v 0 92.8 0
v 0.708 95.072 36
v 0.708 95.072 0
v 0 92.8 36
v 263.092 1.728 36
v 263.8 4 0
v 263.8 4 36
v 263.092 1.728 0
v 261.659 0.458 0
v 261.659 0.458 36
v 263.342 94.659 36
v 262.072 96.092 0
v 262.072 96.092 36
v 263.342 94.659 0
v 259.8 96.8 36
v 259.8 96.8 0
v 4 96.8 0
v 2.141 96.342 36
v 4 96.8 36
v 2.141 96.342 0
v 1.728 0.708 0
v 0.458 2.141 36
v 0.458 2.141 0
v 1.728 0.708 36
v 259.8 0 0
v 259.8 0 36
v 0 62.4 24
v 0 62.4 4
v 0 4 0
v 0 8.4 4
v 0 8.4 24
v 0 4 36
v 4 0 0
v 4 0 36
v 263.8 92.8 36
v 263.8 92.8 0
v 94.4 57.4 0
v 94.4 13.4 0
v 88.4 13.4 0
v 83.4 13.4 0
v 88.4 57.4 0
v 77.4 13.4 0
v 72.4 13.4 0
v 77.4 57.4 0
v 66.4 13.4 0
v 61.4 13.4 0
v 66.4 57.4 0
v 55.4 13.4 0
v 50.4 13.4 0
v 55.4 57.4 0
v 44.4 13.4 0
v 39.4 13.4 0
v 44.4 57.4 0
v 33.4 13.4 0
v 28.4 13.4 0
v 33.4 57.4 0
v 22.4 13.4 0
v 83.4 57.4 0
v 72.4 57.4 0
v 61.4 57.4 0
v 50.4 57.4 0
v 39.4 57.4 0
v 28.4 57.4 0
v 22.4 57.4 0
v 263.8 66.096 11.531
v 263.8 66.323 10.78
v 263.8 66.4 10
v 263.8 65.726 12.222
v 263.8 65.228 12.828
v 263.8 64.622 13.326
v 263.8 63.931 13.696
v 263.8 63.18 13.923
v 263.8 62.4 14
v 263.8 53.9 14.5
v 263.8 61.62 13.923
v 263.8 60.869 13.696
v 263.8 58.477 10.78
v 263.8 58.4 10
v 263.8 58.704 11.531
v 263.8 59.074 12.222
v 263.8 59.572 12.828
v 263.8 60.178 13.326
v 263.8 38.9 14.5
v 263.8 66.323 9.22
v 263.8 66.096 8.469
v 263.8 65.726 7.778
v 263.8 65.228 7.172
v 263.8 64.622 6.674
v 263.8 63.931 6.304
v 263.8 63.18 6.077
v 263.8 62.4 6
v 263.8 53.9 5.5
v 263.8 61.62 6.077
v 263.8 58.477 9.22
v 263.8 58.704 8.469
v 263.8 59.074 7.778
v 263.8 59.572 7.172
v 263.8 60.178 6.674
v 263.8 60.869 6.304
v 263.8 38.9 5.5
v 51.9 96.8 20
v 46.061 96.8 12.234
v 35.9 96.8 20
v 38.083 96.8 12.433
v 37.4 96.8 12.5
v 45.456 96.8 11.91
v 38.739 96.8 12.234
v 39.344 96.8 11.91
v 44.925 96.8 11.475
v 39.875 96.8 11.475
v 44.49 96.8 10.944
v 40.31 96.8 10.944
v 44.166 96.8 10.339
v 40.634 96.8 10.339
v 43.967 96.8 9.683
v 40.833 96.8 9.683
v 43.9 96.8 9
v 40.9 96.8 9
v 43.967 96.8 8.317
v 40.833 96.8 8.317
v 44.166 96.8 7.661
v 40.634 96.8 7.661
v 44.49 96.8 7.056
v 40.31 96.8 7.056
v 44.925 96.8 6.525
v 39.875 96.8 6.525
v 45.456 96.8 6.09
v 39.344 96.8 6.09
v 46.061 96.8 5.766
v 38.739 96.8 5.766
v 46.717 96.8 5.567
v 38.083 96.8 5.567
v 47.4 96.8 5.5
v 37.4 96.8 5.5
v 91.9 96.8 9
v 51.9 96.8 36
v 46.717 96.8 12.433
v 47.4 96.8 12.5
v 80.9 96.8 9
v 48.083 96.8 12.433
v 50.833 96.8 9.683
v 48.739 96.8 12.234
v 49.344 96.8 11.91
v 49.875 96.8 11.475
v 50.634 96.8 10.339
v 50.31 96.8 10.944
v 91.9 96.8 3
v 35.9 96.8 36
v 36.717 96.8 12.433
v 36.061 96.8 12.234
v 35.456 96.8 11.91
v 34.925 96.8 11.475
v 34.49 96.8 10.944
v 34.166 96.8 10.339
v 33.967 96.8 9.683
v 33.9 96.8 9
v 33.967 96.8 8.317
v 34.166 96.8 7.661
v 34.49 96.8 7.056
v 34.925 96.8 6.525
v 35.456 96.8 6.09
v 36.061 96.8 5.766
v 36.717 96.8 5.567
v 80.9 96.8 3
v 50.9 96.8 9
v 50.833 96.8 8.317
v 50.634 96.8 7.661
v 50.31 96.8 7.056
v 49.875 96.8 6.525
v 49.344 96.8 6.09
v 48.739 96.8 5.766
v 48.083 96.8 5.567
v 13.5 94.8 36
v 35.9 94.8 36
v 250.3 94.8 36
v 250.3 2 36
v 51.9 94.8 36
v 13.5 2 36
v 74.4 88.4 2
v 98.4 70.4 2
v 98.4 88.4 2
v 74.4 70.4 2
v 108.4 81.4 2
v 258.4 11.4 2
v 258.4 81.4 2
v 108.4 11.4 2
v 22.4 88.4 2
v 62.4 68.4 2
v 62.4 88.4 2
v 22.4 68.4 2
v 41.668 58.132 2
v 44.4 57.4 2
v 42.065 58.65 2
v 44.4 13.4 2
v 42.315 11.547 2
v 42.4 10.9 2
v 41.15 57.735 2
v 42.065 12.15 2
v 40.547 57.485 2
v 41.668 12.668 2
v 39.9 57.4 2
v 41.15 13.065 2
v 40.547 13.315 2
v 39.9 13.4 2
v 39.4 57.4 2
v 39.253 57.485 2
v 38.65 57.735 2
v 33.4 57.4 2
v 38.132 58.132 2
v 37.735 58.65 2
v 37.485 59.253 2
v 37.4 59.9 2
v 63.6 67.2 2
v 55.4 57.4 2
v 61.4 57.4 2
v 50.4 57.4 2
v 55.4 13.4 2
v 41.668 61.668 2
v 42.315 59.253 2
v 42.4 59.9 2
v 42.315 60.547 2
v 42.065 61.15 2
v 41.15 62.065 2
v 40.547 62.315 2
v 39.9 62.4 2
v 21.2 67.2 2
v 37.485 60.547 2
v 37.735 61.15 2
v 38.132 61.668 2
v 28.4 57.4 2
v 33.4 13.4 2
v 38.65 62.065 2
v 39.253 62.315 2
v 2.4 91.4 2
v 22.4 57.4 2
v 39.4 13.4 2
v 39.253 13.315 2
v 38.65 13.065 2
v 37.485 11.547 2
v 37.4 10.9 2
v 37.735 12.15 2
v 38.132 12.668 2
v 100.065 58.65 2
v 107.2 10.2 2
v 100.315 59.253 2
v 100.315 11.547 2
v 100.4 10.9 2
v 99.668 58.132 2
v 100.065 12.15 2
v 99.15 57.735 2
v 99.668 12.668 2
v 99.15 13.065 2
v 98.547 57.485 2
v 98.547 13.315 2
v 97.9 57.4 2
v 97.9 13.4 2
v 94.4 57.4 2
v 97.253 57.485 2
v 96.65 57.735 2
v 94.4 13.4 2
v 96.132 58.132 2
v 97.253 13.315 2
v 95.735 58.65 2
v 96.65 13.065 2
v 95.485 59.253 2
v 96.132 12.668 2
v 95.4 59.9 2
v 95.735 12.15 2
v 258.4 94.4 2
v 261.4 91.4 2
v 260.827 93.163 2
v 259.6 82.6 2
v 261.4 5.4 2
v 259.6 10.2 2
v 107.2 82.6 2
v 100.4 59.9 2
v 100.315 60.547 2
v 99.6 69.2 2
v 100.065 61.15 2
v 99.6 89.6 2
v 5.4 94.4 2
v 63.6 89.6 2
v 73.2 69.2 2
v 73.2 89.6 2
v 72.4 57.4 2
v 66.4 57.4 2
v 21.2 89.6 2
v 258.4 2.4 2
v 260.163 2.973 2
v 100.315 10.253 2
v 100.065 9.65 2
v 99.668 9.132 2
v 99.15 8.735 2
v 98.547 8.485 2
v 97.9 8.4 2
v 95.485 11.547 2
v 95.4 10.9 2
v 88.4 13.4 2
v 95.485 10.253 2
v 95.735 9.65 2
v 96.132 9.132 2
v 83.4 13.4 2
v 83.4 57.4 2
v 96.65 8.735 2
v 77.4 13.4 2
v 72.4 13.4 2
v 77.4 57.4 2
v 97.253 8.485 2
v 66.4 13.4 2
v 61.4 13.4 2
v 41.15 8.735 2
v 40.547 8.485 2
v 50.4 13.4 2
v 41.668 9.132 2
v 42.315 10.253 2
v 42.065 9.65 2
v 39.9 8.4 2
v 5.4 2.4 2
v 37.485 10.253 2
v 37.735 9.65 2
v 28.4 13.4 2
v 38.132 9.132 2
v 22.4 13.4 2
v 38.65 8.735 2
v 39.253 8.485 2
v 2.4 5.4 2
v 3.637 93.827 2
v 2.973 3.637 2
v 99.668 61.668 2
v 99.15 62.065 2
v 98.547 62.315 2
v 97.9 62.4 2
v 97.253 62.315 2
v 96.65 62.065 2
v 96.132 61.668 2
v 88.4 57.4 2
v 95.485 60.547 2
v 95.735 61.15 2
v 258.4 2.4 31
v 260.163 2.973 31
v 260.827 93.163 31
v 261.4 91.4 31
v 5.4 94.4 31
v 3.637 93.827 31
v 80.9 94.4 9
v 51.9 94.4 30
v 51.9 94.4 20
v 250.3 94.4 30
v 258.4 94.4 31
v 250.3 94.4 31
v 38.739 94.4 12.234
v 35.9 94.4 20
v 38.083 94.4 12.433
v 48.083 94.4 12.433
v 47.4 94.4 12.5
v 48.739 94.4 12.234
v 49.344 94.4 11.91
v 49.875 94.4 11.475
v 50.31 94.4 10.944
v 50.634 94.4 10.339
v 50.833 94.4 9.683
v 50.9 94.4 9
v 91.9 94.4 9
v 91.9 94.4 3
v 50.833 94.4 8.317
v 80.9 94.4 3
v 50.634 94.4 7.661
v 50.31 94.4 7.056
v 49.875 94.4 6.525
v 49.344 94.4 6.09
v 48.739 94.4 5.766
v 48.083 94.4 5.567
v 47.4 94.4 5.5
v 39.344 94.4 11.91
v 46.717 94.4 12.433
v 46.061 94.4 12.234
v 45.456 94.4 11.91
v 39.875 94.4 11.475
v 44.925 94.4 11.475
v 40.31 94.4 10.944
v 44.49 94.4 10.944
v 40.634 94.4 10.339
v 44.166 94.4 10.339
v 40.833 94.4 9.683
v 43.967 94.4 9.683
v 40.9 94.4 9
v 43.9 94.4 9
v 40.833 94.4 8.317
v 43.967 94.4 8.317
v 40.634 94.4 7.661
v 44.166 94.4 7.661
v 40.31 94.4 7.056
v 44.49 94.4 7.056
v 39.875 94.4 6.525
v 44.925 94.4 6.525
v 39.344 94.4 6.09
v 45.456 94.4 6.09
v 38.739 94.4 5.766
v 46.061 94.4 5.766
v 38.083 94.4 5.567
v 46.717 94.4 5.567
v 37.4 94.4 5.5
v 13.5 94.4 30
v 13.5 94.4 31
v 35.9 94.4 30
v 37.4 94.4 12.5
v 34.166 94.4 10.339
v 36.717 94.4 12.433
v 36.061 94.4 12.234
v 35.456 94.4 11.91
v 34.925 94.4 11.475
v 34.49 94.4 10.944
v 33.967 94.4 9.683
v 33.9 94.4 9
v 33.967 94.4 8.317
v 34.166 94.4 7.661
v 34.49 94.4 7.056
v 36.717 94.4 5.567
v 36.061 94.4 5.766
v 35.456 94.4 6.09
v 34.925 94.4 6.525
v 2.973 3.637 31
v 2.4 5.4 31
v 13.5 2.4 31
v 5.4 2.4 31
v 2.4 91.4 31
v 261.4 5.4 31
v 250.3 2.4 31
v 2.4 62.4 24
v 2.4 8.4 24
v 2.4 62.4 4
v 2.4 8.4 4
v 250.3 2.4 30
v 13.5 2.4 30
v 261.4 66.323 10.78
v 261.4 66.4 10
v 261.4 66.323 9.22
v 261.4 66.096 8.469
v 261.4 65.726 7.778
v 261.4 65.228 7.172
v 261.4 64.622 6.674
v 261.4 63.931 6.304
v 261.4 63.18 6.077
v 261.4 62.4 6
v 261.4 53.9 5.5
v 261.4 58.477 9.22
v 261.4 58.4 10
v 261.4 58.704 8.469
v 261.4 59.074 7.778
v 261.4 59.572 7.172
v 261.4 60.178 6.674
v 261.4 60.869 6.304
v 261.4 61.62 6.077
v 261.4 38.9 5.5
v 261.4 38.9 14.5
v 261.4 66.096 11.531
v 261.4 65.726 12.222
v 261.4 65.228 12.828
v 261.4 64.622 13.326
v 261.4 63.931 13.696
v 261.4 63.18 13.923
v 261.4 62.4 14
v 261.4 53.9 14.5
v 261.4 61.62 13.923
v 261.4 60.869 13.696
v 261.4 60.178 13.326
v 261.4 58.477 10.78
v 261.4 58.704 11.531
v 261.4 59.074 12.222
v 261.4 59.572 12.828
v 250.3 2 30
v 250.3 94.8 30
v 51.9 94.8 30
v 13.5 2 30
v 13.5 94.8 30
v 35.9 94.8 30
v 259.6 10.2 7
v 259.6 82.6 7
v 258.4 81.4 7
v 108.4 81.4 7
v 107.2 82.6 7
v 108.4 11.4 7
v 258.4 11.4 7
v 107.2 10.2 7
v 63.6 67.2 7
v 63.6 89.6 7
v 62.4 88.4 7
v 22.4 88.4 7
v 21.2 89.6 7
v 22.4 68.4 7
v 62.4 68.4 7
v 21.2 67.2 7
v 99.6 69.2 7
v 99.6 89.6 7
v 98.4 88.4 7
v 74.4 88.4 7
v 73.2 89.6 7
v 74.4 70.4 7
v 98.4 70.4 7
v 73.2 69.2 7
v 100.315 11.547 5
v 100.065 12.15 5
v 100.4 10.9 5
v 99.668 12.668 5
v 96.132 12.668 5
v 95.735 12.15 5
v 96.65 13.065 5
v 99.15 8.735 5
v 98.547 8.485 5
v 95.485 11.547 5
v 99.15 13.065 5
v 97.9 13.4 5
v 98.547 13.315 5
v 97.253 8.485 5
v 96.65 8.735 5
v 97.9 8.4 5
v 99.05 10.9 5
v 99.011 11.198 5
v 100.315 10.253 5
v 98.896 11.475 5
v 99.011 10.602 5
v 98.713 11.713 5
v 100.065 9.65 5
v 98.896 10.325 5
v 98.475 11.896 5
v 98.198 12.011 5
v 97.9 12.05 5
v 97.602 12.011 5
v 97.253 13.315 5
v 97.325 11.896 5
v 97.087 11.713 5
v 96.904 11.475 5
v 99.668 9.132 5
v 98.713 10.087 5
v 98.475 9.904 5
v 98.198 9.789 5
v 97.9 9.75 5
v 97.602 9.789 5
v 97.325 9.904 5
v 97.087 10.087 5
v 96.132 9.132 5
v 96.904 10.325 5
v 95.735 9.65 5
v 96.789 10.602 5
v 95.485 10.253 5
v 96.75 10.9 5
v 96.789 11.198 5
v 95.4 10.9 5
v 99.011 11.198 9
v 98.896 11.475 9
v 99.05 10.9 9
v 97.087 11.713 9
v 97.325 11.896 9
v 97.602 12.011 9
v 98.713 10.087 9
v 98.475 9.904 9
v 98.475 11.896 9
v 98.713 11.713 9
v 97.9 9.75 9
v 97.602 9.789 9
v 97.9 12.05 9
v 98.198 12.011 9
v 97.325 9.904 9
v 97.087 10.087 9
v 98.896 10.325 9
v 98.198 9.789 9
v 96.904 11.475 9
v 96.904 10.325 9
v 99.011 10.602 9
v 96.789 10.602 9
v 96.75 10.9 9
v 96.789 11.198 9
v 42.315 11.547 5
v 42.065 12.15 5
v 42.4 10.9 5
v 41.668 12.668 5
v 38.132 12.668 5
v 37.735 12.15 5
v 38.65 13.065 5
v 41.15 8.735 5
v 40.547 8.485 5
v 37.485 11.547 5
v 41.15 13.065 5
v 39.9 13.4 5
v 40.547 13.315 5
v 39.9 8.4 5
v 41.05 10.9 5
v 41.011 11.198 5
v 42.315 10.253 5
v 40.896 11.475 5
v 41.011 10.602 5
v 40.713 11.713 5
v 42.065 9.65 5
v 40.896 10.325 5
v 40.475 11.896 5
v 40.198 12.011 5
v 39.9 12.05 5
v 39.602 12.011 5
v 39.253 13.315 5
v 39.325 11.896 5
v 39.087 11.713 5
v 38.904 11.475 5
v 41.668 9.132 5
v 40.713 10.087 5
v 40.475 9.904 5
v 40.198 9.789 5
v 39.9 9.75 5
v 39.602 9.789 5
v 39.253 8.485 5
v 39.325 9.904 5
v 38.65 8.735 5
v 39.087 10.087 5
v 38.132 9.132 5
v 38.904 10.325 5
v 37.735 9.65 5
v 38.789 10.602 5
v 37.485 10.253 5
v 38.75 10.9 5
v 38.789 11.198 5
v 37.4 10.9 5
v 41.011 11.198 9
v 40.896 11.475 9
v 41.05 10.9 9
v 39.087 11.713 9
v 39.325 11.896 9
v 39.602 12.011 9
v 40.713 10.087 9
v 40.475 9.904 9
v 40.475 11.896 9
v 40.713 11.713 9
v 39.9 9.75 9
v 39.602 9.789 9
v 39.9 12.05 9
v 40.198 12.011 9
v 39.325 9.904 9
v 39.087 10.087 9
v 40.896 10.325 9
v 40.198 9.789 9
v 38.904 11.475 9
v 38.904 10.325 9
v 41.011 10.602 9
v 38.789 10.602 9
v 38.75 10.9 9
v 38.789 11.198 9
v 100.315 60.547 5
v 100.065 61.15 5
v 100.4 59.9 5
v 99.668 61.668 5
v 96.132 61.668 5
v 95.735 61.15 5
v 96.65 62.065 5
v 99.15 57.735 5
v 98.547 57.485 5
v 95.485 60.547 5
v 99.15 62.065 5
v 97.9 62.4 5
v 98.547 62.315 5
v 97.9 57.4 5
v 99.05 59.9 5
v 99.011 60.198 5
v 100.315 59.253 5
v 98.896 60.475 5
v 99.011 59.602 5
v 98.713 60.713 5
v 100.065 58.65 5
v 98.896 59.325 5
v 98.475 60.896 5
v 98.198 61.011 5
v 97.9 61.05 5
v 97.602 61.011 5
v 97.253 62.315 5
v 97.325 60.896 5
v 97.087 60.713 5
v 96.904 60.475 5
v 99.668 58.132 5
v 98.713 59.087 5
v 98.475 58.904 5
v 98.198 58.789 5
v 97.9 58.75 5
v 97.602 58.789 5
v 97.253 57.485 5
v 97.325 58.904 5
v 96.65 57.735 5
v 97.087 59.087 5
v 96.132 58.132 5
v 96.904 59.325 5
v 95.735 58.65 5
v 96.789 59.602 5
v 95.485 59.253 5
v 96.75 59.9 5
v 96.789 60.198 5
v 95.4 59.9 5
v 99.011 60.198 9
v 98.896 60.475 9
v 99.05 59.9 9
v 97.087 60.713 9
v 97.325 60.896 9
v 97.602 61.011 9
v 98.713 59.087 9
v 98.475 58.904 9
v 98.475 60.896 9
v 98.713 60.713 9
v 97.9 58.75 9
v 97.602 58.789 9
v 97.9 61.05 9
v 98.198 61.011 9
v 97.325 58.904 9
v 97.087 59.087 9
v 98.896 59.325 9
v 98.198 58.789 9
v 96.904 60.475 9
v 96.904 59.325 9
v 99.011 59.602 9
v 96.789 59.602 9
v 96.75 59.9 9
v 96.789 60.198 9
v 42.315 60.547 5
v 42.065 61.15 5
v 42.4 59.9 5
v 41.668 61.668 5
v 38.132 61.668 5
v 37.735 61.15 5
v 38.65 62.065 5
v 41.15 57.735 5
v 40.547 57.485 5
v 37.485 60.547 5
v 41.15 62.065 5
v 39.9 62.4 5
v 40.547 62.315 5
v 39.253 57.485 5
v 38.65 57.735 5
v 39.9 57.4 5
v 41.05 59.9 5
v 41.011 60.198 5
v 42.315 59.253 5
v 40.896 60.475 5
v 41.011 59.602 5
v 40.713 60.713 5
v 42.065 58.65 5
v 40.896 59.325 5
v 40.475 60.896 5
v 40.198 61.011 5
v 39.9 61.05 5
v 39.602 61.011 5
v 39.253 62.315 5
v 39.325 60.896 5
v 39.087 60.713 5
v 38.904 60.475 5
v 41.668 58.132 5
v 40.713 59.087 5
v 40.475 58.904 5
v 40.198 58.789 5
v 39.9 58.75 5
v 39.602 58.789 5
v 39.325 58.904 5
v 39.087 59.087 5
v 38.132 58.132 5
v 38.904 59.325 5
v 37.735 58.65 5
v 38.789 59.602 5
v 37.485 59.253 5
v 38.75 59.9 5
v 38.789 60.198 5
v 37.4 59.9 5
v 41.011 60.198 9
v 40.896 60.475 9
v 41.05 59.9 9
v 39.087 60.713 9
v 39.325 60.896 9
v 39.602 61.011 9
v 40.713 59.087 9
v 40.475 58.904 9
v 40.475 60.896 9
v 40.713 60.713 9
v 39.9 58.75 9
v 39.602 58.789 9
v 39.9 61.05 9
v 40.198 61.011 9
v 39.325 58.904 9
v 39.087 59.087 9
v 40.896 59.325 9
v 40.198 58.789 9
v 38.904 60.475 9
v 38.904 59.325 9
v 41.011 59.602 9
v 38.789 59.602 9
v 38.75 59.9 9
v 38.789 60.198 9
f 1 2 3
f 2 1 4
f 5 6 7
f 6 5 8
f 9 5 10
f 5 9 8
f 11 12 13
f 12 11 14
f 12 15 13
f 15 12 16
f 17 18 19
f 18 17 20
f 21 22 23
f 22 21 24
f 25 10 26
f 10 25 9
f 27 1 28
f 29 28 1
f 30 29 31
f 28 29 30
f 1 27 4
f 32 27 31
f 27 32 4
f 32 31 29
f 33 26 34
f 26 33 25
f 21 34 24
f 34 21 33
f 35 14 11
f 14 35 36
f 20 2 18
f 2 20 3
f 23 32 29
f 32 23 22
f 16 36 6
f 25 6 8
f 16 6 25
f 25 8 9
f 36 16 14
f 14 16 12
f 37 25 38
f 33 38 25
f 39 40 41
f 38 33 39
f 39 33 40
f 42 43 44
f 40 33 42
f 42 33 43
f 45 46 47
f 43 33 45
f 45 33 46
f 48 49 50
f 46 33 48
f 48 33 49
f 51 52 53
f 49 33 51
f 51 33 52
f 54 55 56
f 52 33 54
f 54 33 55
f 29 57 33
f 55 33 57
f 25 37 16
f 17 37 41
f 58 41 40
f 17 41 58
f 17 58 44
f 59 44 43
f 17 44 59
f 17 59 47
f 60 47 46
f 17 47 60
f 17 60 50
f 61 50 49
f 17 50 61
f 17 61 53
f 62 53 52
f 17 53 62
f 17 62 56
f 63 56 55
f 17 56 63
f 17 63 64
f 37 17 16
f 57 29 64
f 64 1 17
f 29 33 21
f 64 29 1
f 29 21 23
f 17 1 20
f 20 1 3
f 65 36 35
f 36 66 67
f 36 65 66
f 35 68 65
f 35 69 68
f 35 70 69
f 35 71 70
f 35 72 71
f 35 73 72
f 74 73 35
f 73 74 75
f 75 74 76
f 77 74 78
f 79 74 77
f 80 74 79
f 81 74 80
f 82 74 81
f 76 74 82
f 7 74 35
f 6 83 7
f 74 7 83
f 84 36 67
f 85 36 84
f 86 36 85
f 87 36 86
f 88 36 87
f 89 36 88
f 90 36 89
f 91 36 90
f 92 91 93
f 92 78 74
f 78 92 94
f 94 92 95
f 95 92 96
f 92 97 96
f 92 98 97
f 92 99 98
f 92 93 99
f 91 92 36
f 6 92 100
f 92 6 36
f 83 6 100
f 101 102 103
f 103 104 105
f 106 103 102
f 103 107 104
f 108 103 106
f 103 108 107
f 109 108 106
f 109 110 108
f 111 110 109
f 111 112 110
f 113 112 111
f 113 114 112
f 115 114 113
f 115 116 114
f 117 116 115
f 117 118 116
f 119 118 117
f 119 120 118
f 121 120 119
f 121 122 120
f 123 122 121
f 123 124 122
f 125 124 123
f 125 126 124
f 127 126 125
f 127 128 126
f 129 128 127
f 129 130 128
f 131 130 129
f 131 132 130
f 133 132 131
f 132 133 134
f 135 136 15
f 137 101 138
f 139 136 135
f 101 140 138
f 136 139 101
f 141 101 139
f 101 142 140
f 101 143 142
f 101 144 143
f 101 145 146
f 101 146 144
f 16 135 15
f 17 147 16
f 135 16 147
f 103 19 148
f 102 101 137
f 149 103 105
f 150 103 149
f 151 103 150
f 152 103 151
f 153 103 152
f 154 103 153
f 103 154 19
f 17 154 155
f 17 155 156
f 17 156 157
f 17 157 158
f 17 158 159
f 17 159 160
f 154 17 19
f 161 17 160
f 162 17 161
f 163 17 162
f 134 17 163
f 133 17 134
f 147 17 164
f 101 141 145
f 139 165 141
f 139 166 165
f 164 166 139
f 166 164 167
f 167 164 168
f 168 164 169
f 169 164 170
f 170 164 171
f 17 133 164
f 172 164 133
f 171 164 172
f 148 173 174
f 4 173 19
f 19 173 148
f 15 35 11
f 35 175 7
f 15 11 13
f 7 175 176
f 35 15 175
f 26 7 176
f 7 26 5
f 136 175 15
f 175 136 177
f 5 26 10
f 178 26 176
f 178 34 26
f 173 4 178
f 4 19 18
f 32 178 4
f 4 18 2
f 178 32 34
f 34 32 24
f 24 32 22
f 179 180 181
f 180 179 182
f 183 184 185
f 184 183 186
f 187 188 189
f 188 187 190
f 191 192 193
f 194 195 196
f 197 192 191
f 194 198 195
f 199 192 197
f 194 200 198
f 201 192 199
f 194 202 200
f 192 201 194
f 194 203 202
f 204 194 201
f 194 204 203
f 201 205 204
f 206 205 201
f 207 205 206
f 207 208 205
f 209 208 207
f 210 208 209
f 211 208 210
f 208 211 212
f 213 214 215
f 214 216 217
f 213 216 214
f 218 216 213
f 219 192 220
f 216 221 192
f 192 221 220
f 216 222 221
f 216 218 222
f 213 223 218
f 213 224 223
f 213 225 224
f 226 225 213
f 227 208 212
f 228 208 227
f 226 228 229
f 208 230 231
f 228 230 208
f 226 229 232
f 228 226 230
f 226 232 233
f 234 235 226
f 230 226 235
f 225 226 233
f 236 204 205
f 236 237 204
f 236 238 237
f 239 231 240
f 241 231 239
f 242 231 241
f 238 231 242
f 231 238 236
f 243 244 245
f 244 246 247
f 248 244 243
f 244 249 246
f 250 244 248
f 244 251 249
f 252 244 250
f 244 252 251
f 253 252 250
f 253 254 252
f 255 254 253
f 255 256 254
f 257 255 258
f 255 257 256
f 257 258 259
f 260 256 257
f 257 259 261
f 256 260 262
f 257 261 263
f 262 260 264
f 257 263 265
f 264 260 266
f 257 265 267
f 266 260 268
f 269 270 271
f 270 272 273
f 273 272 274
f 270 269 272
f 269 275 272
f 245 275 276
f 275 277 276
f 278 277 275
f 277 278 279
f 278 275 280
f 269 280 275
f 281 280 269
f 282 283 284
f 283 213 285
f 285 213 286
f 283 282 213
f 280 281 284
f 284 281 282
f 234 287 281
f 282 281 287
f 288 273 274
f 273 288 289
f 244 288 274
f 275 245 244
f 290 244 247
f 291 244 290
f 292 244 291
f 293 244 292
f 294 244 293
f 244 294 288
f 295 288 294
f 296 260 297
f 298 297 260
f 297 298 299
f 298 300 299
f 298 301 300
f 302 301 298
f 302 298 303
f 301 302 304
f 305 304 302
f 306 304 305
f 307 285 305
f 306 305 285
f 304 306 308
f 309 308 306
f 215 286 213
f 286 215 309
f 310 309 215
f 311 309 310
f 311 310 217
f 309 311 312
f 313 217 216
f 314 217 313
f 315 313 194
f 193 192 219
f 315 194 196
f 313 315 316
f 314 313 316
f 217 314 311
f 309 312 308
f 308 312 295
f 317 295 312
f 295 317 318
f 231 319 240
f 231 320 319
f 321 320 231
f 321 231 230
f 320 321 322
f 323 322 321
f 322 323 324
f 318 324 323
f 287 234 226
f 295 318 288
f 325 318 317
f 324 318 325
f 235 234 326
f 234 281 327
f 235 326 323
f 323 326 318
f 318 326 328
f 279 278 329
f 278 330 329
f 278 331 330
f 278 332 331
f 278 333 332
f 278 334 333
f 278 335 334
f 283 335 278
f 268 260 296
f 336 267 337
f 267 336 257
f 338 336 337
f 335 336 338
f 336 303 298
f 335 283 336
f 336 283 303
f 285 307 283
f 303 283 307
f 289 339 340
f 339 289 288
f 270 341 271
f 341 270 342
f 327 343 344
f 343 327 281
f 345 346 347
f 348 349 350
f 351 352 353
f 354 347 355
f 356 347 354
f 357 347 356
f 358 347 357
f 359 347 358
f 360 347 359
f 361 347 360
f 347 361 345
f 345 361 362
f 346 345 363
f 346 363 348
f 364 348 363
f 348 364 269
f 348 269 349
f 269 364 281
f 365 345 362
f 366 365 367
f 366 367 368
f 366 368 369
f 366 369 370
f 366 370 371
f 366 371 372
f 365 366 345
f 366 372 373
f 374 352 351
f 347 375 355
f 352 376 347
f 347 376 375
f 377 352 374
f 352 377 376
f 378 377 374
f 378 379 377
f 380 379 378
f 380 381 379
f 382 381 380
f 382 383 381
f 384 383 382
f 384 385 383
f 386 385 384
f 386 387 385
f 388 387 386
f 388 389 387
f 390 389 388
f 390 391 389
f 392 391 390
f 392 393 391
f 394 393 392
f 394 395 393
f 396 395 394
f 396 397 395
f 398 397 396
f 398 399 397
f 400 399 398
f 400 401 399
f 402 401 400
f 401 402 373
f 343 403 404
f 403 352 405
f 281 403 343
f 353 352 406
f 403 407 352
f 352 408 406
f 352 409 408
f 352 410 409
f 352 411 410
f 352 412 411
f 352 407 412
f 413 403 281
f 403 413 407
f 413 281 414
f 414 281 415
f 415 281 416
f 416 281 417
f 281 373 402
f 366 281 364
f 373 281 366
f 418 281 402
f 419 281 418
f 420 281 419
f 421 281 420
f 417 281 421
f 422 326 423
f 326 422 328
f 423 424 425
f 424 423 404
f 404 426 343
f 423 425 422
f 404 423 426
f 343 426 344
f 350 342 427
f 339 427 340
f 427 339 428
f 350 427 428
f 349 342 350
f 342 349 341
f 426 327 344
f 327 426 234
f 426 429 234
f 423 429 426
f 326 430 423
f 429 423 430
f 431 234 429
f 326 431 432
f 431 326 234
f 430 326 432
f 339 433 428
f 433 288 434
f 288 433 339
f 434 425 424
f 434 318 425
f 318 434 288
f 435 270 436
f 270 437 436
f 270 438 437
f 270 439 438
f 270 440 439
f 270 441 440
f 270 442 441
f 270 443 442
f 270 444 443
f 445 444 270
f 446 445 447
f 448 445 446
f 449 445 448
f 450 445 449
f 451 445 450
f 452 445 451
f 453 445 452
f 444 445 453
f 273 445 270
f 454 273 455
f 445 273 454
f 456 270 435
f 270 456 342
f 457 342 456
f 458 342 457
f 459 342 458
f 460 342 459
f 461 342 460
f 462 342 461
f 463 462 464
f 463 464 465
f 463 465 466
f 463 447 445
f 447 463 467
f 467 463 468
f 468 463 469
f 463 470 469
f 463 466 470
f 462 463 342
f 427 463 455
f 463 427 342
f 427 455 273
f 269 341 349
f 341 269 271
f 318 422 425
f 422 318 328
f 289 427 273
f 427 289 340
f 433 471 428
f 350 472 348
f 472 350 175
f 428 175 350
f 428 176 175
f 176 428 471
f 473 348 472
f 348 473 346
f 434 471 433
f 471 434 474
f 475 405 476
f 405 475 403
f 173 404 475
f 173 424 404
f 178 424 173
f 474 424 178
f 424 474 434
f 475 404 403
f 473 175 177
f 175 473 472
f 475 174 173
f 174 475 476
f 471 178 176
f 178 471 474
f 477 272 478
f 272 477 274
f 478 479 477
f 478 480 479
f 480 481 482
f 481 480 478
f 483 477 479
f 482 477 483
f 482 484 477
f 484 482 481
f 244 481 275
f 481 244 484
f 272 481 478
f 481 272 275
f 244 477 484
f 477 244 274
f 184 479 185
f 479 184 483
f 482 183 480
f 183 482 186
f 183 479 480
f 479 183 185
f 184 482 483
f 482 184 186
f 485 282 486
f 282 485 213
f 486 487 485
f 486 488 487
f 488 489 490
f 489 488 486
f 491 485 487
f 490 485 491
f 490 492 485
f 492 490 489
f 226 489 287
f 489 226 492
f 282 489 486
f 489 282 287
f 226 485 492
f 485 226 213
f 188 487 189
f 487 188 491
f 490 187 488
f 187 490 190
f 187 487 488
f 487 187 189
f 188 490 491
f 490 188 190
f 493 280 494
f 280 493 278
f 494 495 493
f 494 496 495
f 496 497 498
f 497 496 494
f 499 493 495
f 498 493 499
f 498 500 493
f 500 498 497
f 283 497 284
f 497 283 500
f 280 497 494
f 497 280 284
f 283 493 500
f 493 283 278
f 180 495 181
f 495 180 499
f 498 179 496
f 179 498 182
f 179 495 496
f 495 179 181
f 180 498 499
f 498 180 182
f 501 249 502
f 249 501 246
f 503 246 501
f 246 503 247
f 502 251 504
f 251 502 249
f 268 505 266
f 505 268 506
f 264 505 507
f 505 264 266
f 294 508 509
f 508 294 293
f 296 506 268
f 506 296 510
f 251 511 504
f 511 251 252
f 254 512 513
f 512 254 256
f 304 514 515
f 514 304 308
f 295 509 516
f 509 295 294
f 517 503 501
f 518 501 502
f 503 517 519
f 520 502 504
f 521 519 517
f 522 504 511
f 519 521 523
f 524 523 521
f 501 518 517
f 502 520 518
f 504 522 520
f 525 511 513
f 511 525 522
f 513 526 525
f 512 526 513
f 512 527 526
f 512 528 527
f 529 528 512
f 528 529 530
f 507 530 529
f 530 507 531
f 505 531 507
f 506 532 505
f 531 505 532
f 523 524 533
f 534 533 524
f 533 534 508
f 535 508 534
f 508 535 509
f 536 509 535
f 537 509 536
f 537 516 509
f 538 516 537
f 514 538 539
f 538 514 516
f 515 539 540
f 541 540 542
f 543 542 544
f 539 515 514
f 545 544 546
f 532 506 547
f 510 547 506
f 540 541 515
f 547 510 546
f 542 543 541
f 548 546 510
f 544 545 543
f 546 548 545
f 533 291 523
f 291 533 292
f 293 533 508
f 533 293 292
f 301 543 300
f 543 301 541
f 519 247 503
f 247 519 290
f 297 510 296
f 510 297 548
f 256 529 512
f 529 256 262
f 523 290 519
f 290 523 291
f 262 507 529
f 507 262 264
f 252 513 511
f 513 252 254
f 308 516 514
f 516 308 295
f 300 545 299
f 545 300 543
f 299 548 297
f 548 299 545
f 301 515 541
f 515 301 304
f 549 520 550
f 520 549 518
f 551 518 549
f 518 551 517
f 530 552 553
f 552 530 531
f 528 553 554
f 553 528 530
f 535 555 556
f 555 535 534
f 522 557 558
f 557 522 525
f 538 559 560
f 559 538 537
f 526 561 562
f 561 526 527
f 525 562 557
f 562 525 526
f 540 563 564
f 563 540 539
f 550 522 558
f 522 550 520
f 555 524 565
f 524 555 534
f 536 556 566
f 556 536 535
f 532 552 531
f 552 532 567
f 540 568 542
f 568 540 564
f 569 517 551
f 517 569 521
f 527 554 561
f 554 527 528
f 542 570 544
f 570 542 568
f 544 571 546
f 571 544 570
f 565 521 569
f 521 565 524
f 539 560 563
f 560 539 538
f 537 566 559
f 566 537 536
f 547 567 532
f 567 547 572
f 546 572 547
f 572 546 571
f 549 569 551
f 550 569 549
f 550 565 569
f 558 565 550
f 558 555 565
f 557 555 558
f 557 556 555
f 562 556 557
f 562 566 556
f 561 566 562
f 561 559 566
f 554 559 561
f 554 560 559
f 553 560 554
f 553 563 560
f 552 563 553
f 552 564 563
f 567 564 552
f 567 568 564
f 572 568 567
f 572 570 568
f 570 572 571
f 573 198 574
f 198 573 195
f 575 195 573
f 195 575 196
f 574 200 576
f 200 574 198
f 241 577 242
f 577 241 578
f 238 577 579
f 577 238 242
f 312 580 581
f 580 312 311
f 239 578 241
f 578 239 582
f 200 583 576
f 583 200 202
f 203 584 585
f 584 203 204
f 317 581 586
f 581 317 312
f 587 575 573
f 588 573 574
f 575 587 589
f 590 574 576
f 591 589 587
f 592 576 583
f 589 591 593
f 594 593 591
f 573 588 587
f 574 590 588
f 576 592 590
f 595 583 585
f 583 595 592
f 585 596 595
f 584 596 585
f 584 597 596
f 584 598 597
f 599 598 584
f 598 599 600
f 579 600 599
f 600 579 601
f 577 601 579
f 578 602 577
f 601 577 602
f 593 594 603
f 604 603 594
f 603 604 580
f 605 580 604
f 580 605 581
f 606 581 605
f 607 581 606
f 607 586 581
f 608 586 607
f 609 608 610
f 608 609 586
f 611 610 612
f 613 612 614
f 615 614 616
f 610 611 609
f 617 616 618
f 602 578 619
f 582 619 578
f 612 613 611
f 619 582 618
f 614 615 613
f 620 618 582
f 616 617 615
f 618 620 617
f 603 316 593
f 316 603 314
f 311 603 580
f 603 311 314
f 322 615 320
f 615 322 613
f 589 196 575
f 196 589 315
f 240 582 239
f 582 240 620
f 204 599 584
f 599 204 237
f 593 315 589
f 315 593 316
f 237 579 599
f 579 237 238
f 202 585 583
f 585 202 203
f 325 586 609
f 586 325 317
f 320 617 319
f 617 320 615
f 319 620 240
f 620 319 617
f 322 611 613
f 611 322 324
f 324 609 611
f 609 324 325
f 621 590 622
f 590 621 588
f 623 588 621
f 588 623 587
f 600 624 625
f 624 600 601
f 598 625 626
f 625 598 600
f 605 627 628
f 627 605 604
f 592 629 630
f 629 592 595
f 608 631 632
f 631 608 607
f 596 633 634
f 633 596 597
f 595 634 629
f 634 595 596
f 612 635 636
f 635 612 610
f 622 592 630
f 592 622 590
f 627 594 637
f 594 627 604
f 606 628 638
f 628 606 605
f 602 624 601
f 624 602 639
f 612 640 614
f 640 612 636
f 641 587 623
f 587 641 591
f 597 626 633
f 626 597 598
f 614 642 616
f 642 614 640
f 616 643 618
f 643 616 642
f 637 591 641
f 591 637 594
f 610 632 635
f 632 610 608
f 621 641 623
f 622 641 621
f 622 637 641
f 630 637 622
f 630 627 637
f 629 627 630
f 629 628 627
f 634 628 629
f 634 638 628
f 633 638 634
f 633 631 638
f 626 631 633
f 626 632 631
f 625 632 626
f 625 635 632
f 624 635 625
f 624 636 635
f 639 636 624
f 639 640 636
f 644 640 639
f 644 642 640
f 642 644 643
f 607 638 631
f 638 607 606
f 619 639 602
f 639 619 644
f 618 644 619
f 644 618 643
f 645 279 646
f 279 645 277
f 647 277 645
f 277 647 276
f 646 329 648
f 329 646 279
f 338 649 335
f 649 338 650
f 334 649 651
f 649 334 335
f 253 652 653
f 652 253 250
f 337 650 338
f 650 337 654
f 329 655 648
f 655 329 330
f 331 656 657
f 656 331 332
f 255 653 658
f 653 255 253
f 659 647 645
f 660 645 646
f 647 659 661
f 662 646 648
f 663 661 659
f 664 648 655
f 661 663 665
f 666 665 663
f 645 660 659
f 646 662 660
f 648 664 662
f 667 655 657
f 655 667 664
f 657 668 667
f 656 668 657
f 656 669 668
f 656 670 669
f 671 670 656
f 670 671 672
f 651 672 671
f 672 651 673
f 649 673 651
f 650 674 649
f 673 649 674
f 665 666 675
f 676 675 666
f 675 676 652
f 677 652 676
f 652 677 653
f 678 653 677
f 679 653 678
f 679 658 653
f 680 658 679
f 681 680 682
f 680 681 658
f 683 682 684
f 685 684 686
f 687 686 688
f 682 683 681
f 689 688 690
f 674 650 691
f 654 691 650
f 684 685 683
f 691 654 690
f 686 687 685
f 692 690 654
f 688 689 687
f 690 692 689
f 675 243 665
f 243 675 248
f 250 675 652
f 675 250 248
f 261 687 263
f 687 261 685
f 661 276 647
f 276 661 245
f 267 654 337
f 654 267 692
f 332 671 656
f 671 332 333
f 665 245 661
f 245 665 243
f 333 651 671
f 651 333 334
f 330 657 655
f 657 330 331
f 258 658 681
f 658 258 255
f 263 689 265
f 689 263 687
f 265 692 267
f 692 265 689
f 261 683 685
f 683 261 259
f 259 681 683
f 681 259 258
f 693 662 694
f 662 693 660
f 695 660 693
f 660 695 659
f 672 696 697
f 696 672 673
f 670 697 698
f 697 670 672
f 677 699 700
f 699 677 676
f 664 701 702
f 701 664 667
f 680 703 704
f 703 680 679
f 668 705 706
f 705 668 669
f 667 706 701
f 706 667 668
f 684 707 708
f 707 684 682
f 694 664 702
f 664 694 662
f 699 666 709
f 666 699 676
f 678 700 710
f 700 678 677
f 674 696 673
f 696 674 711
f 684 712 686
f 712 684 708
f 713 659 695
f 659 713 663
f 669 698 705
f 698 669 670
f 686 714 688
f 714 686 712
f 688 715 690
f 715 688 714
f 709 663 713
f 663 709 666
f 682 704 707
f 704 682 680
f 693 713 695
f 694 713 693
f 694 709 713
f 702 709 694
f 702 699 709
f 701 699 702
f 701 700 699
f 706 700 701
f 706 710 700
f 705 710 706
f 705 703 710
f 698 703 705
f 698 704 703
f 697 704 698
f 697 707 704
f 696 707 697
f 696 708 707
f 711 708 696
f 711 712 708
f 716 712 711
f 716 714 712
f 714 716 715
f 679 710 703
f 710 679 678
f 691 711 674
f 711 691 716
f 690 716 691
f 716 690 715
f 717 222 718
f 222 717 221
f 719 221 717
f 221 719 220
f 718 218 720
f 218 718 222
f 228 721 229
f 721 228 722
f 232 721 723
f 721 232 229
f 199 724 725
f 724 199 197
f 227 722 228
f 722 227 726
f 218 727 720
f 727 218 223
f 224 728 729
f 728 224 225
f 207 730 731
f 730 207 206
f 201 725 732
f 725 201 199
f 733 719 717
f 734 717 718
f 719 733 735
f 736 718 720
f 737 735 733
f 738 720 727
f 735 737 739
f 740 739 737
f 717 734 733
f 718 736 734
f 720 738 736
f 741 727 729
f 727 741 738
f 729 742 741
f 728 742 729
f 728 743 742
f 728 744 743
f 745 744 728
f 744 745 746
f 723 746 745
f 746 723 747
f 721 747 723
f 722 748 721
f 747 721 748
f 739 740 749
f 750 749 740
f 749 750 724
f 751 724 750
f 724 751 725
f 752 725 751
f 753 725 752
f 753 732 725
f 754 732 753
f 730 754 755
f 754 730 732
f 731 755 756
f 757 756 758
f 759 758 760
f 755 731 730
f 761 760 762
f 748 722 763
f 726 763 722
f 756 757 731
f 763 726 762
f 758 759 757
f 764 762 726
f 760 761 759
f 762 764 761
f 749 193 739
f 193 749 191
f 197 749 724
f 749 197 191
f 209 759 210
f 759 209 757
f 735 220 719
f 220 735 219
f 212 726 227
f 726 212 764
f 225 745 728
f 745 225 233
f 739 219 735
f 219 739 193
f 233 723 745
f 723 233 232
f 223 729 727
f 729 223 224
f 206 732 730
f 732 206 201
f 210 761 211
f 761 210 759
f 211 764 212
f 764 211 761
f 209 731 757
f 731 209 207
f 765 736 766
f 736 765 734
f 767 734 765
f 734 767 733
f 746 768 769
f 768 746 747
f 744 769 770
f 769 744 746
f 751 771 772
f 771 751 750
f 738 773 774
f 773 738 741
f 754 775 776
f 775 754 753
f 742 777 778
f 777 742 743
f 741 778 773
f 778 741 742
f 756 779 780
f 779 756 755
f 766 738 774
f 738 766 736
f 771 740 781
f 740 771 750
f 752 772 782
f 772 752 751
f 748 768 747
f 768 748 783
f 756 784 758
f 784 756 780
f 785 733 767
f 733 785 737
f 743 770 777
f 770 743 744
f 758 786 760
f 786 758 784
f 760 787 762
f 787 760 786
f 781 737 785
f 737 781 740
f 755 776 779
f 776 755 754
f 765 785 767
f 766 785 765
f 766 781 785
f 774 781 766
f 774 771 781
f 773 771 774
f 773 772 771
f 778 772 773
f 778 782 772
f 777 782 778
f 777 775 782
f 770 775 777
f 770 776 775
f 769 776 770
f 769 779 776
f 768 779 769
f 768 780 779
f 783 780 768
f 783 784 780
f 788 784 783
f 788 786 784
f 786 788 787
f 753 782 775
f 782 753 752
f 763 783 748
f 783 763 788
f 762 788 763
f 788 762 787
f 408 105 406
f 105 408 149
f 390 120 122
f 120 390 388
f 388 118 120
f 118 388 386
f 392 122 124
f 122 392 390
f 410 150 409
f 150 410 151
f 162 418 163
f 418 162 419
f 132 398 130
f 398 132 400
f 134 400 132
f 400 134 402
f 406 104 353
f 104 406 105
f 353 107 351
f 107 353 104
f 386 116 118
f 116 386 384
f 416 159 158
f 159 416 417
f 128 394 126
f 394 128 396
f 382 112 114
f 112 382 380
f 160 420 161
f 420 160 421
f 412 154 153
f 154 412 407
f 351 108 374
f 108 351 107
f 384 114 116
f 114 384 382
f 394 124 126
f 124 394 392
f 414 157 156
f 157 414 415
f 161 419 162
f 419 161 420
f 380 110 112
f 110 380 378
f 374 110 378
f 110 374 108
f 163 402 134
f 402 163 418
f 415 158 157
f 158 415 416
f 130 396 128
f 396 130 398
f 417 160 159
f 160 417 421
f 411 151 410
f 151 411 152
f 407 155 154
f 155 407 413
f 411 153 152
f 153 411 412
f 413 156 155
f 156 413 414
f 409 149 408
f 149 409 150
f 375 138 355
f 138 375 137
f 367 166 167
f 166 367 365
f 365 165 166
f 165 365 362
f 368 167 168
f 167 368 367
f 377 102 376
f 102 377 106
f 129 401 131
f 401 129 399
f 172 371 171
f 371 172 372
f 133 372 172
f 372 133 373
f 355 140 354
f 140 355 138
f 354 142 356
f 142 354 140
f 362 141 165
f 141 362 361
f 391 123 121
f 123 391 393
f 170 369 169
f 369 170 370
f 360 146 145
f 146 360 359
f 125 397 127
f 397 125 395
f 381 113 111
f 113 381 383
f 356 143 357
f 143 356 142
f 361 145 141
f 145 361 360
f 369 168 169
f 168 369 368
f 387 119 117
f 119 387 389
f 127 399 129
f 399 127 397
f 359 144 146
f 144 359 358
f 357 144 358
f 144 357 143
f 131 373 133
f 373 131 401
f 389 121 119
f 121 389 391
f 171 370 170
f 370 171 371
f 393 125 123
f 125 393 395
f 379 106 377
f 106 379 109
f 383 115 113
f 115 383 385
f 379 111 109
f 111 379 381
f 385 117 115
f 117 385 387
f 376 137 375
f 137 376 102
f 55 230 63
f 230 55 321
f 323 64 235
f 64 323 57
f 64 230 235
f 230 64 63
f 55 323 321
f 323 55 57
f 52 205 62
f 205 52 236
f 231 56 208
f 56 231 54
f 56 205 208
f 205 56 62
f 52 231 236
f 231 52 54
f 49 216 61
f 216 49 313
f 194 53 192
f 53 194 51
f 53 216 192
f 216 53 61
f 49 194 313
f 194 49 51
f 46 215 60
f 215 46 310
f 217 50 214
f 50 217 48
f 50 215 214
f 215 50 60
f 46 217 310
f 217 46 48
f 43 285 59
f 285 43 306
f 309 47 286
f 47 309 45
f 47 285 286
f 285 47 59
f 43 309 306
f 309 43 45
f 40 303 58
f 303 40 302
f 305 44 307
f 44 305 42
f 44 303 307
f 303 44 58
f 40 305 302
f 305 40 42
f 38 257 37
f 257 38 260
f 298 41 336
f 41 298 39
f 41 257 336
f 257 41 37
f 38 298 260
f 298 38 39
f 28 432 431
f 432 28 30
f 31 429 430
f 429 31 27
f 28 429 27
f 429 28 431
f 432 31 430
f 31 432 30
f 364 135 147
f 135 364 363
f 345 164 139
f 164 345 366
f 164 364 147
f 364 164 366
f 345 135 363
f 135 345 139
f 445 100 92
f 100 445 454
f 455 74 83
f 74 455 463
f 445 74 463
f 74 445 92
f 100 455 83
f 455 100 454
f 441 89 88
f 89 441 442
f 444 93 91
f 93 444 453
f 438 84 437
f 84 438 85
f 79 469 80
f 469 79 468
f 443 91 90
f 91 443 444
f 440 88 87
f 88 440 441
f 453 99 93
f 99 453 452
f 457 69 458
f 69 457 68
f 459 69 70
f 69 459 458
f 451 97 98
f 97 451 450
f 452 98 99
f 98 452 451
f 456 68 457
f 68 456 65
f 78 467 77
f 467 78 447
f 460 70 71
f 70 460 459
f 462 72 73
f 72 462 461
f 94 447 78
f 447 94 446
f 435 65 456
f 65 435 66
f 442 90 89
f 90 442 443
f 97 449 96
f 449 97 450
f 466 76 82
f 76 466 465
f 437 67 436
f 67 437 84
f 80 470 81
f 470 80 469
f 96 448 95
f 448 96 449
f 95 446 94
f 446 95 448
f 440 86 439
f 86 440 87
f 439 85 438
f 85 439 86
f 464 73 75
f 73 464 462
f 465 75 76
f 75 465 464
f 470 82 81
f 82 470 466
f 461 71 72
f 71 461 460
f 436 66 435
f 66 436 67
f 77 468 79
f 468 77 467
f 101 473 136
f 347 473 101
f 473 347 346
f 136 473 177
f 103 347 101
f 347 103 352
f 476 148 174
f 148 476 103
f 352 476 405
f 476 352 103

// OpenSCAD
// SAGGA HUB: the tray under the FM-1 that holds the modules: Raspberry Pi 3B, powerbank, MICROMIDITRS-USB v2,
// RP2040-Zero. Parametric: measure your own parts and the FM-1, put the numbers in the first block, press F6, export
// the STL. Units: mm. The FM-1 sits on top in a shallow seat and closes the tray; the modules sit below in pockets;
// the cables run in the gap above them. Print: PETG or PLA, 0.2 mm layers, 3 walls, no supports (open top).
//
// Coordinates: x from the left wall, y from the front wall, z from the floor; module positions are those of their
// front-left corner INSIDE the tray (the wall thickness is added for you).

// ============================ 1. measure these ============================
// the FM-1: length left-right, depth front-back, height; and where its ports are on its back face
fm1 = [236, 92, 34];                 // PLACEHOLDER
fm1_usbc_from_left = 30;             // PLACEHOLDER: centre of its USB-C socket, from its left edge
fm1_seat_depth = 6;                  // how far the FM-1 sinks into the seat (a lip all around; keep it under its ports)

// the Raspberry Pi 3B (fixed numbers, Raspberry Pi's own drawing), USB face toward the left wall
pi = [85, 56, 20];                   // board + connectors + the pegs it rests on
pi_pos = [14, 5];                    // x = the recess: cables from outside reach its four USB-A through the window
pi_usb_face_up = 12;                 // centre of the USB block above the floor (3 mm pegs + board + 8 mm)

// the powerbank: measure it, and where its input socket and button are
pb = [150, 70, 16];                  // PLACEHOLDER: length, depth, height
pb_pos = [106, 9];                   // PLACEHOLDER
pb_wall = "right";                   // the wall its input socket faces: "right", "back", "front" (or "left")
pb_in_along = 44;                    // PLACEHOLDER: centre of the input socket along that wall, measured from the
                                     //   front (right/left wall) or from the left (back/front wall), INSIDE coordinates
pb_in_up = 8;                        // PLACEHOLDER: its centre above the floor (the powerbank lies flat: ~ half its height)
pb_in_win = [15, 9];                 // the window: wide enough for the charger plug's overmold (USB-C plugs are ~ 12 x 6.5)
pb_btn_along = 60;                   // PLACEHOLDER: the power button, same wall (set to -1 if it has none you need)
pb_btn_d = 8;

// the MICROMIDITRS-USB v2: jacks and LEDs on one face, toward the back wall. Measure the body and the jack spacing.
midi = [40, 20, 12];                 // PLACEHOLDER
midi_pos = [20, 66];                 // PLACEHOLDER
midi_jack_dx = [-5, 5];              // PLACEHOLDER: the two TRS jacks, from the centre of its back face
midi_jack_up = 7;                    // PLACEHOLDER: their centre above the floor
midi_jack_d = 7;                     // hole for a 3.5 mm plug's barrel

// the RP2040-Zero (23.5 x 18), USB-C toward the back wall: the "PC" socket
rp = [24, 18, 6];
rp_pos = [72, 68];

// ============================ 2. the tray ============================
wall_t = 2.4;
floor_t = 2.0;
gap = 8;                             // cable room above the tallest module
corner = 4;
rib_h = 5;                           // the pockets' ribs

modules = [[pi, pi_pos], [pb, pb_pos], [midi, midi_pos], [rp, rp_pos]];
function need_x() = max([for (m = modules) m[1][0] + m[0][0]]) + 3;
function need_y() = max([for (m = modules) m[1][1] + m[0][1]]) + 3;
function tallest() = max([for (m = modules) m[0][2]]);

inner = [max(fm1[0], need_x()), max(fm1[1], need_y())];      // the tray grows past the FM-1 if the modules need it
inner_h = tallest() + gap;
tray = [inner[0] + 2 * wall_t, inner[1] + 2 * wall_t, floor_t + inner_h + fm1_seat_depth];
seat_off = [(inner[0] - fm1[0]) / 2, (inner[1] - fm1[1]) / 2];   // the FM-1 seat is centred on the tray

echo(str("tray ", tray[0], " x ", tray[1], " x ", tray[2], " mm; inner ", inner[0], " x ", inner[1], ", modules need ",
         need_x(), " x ", need_y()));
if (need_x() > fm1[0] || need_y() > fm1[1])
    echo("NOTE: the modules need more room than the FM-1's footprint: the tray is wider than the FM-1");

module rrect(size, r) { offset(r = r) offset(delta = -r) square(size); }

module shell() {
    difference() {
        linear_extrude(tray[2]) rrect([tray[0], tray[1]], corner);
        // the module space
        translate([wall_t, wall_t, floor_t]) linear_extrude(inner_h + 1) rrect(inner, corner - 1);
        // the seat: the FM-1 drops in fm1_seat_depth and rests on the rim of the module space
        translate([wall_t + seat_off[0] - 0.4, wall_t + seat_off[1] - 0.4, tray[2] - fm1_seat_depth])
            cube([fm1[0] + 0.8, fm1[1] + 0.8, fm1_seat_depth + 1]);
    }
}

// a window through one wall. along: its centre along the wall, inside coordinates (from the front for the left and
// right walls, from the left for the front and back walls); up: its centre above the floor; w, h: its size;
// d > 0 instead: a round hole of that diameter.
module win(wall, along, up, w = 0, h = 0, d = 0) {
    z = floor_t + up;
    a = wall_t + along;
    t = wall_t + 2;
    if (wall == "back")  translate([a, tray[1] - wall_t - 1, z]) rotate([-90, 0, 0]) hole(w, h, d, t);
    if (wall == "front") translate([a, -1, z])                    rotate([-90, 0, 0]) hole(w, h, d, t);
    if (wall == "left")  translate([-1, a, z])                    rotate([0, 90, 0])  hole(h, w, d, t);
    if (wall == "right") translate([tray[0] - wall_t - 1, a, z])  rotate([0, 90, 0])  hole(h, w, d, t);
}
module hole(w, h, d, t) {   // a prism along +z of length t, centred in x/y, square-ish or round
    if (d > 0) cylinder(d = d, h = t, $fn = 32);
    else translate([-w / 2, -h / 2, 0]) cube([w, h, t]);
}

module windows() {
    // the Pi's four USB-A (and the Ethernet, same block) through the left wall; the recess in front of them is
    // where the inside cables (FM-1, MICROMIDITRS) plug in too
    win("left", pi_pos[1] + pi[1] / 2, pi_usb_face_up, 54, 20);
    // the PC socket: the RP2040-Zero's USB-C
    win("back", rp_pos[0] + rp[0] / 2, 4, 11, 6);
    // the MIDI TRS jacks
    for (dx = midi_jack_dx) win("back", midi_pos[0] + midi[0] / 2 + dx, midi_jack_up, d = midi_jack_d);
    // the powerbank: charge it without taking it out, and reach its button
    win(pb_wall, pb_in_along, pb_in_up, pb_in_win[0], pb_in_win[1]);
    if (pb_btn_along >= 0) win(pb_wall, pb_btn_along, pb_in_up, d = pb_btn_d);
    // the FM-1's own USB-C: a slot through the seat's back lip so the right-angle plug comes down into the tray
    translate([wall_t + seat_off[0] + fm1_usbc_from_left - 8, tray[1] - wall_t - 1, floor_t + inner_h - 10])
        cube([16, wall_t + 2, 10 + fm1_seat_depth + 1]);
    // air under the Pi
    for (i = [0 : 6]) translate([wall_t + pi_pos[0] + 6 + i * 11, wall_t + pi_pos[1] + 6, -1]) cube([6, pi[1] - 12, floor_t + 2]);
}

module pockets() {   // low ribs around each module (not the Pi: its pegs locate it, and its USB block overhangs)
    for (m = [[pb, pb_pos], [midi, midi_pos], [rp, rp_pos]])
        translate([wall_t + m[1][0] - 1.2, wall_t + m[1][1] - 1.2, floor_t])
            difference() {
                cube([m[0][0] + 2.4, m[0][1] + 2.4, rib_h]);
                translate([1.2, 1.2, -1]) cube([m[0][0], m[0][1], rib_h + 2]);
            }
}

module pi_pegs() {   // the 3B rests on four pegs through its M2.5 holes (58 x 49 pattern, 3.5 mm from the edges);
                     // the board is turned so the USB block faces the left wall
    for (h = [[85 - 3.5, 3.5], [85 - 61.5, 3.5], [85 - 3.5, 52.5], [85 - 61.5, 52.5]])
        translate([wall_t + pi_pos[0] + h[0], wall_t + pi_pos[1] + h[1], floor_t]) {
            cylinder(d = 5, h = 3, $fn = 24);
            cylinder(d = 2.3, h = 3 + 4, $fn = 24);
        }
}

difference() {
    union() { shell(); pockets(); pi_pegs(); }
    windows();
}

// For checking: the modules as ghosts (comment out before export, or leave: % renders them transparent, not exported)
%for (m = modules) translate([wall_t + m[1][0], wall_t + m[1][1], floor_t]) cube(m[0]);
%translate([wall_t + seat_off[0], wall_t + seat_off[1], tray[2] - fm1_seat_depth]) cube(fm1);
